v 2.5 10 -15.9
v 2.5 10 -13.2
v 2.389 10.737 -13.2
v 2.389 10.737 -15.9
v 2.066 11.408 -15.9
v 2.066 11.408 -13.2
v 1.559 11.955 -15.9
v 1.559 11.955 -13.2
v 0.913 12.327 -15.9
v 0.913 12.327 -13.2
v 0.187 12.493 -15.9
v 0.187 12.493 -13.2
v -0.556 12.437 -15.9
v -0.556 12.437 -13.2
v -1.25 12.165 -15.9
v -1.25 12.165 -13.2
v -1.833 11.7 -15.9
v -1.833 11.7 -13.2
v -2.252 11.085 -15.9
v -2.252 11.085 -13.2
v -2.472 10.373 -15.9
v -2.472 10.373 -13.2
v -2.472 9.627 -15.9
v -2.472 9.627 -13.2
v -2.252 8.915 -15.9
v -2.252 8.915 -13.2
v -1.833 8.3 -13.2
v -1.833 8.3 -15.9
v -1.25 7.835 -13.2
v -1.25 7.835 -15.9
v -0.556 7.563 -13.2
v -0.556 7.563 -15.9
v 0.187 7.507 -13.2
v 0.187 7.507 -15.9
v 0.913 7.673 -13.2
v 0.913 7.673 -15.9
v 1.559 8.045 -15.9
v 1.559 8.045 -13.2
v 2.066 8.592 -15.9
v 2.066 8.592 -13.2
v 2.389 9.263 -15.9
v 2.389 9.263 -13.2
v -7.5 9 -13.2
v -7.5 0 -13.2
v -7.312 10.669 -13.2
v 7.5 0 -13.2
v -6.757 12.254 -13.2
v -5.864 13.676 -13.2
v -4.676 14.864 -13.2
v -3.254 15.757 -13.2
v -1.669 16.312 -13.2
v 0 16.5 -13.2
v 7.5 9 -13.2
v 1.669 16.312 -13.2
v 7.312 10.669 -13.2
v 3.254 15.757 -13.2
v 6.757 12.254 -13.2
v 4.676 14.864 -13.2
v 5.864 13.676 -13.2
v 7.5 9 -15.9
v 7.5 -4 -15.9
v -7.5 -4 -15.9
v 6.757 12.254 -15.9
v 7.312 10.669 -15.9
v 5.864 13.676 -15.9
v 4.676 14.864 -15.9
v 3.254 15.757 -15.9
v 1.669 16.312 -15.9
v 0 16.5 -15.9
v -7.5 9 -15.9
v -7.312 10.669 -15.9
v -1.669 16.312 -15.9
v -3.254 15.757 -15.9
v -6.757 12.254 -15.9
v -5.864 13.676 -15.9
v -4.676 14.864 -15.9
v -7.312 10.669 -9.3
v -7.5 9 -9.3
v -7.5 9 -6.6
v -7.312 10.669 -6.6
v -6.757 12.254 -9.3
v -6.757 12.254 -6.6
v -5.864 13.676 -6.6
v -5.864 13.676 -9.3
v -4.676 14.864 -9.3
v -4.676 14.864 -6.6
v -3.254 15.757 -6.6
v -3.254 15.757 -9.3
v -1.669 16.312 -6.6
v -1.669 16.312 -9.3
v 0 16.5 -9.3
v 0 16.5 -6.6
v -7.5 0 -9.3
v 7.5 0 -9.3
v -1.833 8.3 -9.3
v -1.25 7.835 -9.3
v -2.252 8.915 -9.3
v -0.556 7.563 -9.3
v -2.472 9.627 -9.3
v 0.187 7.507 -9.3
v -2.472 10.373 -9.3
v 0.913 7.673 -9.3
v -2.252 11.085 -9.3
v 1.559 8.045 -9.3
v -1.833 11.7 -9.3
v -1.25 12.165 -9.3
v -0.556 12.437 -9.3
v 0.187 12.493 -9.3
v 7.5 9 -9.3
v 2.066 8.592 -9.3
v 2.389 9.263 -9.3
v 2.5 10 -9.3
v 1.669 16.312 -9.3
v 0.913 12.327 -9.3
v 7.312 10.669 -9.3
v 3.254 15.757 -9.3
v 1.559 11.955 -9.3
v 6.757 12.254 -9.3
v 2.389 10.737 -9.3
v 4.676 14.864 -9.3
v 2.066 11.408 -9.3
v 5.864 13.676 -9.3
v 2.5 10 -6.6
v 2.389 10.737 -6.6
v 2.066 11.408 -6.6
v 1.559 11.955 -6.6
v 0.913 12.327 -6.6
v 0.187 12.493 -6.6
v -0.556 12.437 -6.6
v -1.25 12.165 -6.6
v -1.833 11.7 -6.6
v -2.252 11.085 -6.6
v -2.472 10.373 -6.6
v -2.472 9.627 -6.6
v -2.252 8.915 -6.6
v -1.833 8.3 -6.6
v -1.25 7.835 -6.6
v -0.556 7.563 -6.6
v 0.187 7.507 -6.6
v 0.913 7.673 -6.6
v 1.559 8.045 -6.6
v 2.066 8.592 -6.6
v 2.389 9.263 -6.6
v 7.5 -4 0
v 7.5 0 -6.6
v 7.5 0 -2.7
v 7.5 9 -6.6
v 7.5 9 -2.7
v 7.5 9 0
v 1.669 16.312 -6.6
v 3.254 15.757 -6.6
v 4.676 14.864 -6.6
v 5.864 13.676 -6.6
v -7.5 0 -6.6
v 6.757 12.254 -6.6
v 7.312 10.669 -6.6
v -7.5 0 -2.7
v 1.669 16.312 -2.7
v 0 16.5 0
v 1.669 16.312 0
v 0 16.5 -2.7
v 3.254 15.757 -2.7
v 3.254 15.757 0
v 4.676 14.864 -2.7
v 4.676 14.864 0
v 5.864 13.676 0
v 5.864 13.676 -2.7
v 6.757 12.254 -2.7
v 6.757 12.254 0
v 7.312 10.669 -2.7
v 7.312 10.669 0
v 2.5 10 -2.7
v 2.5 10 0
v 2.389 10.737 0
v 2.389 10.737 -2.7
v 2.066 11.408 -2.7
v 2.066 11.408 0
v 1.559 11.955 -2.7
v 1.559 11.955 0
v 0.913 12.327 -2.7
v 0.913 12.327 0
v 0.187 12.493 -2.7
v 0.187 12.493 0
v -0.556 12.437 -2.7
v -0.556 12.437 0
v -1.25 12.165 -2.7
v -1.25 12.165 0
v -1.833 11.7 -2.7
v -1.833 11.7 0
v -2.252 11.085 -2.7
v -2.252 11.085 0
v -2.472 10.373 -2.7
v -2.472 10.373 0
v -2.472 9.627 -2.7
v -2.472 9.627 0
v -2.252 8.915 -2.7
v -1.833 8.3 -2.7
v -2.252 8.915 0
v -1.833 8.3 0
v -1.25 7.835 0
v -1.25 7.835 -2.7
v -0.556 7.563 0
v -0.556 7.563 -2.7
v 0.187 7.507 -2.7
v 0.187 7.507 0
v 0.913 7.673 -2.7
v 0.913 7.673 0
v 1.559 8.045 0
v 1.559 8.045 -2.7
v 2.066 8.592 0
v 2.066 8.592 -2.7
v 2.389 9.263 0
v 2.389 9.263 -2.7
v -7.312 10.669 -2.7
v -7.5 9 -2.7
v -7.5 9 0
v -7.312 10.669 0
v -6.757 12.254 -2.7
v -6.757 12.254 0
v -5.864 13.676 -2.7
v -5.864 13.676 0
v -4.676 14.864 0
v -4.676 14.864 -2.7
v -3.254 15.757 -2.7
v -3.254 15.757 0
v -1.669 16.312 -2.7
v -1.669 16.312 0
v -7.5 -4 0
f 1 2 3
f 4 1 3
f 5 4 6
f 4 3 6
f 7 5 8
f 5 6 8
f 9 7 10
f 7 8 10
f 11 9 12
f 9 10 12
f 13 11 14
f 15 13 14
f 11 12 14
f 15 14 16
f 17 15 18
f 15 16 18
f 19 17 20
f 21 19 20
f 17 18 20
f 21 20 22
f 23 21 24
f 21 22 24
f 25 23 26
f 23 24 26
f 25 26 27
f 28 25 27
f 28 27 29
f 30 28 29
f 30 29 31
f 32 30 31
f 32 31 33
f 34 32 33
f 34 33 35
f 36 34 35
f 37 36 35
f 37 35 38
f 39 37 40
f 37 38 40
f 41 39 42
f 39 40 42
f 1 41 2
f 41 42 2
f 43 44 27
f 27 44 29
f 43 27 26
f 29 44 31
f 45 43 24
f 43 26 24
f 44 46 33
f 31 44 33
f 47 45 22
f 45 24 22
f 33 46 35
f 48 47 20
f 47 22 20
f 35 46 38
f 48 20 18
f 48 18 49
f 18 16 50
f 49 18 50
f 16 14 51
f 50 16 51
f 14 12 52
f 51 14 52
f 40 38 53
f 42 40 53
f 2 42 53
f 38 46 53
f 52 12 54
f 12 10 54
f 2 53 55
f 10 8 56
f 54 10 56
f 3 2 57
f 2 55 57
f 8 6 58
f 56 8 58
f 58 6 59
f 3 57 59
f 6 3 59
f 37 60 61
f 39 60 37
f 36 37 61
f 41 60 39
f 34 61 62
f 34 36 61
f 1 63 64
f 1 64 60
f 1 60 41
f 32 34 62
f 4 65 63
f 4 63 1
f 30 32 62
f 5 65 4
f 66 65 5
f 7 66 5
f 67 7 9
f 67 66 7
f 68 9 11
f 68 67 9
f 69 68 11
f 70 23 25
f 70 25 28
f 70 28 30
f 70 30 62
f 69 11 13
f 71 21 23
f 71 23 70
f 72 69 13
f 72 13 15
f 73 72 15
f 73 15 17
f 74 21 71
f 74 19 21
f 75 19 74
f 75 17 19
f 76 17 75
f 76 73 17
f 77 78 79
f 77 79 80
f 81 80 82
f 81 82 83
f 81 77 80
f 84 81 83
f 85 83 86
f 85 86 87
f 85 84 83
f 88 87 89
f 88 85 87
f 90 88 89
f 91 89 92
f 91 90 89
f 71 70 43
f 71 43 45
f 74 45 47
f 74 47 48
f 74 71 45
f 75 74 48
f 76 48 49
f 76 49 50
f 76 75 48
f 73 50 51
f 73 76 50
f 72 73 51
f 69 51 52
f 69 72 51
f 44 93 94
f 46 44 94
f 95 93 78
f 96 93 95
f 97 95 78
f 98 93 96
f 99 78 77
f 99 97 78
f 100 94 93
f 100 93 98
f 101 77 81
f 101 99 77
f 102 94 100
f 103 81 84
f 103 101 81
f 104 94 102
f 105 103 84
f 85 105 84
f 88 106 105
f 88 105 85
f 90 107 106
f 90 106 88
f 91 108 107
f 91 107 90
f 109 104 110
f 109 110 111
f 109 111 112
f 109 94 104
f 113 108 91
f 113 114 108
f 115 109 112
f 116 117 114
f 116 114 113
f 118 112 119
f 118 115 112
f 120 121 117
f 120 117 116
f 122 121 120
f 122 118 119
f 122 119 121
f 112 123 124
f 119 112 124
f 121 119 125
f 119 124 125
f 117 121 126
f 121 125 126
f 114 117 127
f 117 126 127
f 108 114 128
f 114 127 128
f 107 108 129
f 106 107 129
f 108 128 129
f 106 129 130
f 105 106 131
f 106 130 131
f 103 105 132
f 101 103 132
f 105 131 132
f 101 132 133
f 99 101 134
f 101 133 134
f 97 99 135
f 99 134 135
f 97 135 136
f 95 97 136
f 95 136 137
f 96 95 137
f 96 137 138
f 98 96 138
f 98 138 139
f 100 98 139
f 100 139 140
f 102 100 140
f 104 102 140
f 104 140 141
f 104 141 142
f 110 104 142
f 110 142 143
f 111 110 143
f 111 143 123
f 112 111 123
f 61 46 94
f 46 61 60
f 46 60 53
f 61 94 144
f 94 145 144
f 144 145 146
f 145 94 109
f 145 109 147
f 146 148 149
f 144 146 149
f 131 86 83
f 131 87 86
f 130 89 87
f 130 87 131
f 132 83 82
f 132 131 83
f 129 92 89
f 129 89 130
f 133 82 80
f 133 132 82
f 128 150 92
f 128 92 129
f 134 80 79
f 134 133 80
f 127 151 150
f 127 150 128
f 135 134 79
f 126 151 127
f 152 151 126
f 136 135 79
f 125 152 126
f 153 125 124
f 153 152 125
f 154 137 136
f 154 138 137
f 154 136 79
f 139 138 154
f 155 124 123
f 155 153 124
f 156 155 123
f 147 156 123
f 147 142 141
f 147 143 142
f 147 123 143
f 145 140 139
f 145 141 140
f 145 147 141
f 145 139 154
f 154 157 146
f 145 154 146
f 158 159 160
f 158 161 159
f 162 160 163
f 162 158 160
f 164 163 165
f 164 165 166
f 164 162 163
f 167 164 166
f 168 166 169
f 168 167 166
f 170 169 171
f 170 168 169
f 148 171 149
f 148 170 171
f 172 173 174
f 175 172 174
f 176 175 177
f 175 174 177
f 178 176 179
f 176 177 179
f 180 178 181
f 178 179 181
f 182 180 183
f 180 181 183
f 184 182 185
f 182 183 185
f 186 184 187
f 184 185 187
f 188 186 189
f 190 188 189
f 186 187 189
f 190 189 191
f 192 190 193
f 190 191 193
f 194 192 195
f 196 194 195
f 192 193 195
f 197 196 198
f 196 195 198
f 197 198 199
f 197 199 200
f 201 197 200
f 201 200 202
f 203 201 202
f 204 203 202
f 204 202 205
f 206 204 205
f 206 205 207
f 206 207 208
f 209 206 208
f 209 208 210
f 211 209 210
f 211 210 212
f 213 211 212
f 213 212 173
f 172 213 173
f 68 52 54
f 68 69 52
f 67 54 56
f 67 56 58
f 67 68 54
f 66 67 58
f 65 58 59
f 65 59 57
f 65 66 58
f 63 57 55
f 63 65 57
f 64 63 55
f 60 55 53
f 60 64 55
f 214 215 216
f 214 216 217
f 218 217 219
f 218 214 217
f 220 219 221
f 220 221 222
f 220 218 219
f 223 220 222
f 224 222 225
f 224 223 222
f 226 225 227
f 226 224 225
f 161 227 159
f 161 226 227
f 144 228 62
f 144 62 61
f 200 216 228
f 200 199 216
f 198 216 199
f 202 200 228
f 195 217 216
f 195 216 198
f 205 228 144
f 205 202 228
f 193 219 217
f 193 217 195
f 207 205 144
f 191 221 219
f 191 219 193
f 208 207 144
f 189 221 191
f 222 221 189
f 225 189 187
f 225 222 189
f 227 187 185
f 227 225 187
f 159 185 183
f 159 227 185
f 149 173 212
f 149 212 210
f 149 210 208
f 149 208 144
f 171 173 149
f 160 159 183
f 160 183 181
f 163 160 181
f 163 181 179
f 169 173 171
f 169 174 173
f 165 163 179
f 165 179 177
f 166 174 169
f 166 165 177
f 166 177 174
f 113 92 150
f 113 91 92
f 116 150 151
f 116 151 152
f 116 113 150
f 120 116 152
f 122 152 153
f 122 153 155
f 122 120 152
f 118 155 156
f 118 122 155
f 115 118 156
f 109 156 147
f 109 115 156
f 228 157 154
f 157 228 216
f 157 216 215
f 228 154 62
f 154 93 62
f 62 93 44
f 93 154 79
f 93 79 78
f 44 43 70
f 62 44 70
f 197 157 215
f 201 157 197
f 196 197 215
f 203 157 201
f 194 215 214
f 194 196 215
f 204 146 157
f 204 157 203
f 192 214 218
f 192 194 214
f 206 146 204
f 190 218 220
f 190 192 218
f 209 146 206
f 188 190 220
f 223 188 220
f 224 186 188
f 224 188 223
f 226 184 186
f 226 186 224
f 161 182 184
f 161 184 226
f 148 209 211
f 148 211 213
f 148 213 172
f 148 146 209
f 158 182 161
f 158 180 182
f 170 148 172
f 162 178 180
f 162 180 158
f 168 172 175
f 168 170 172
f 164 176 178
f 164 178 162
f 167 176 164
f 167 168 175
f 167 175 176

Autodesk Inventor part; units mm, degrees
ref_plane "YZ Plane" through (0, 0, 0) normal (1, 0, 0) x (0, 1, 0)
ref_plane "XZ Plane" through (0, 0, 0) normal (0, 1, 0) x (-1, 0, 0)
ref_plane "XY Plane" through (0, 0, 0) normal (0, 0, 1) x (1, 0, 0)
sketch "Sketch4" plane through (0, 0, 0) normal (0, 0, 1) x (1, 0, 0)
  line L0 (-10.5, 0) -> (10.5, 0) projected
  line L1 (0, -3.3) -> (0, 19.8) projected
  line L2 (-7.5, 0) -> (7.5, 0)
  line L3 (7.5, 0) -> (7.5, 16.5)
  line L4 (7.5, 16.5) -> (-7.5, 16.5)
  line L5 (-7.5, 16.5) -> (-7.5, 0)
  circle A0 centre (0, 10) radius 2.5
  point P0 (0, 0)
  dimension "d0" = 7.5
  dimension "d1" = 7.5
  dimension "d2" = 16.5
  dimension "d3" = 5
  dimension "d4" = 6.5
extrude "Extrusion1" add sketch "Sketch4" against normal blind 15.9 contours L5 L4 L1 A0 L0 | L1 A0 L4 L3 L0
fillet "Fillet1" radius 7.5 2 edges at (7.5, 16.5, -7.95) (-7.5, 16.5, -7.95)
sketch "Sketch13" plane through (7.5, 9, 0) normal (1, 0, 0) x (0, 0, -1)
  line L0 (0, -12.3) -> (0, 10.8) projected
  line L1 (19.08, -9) -> (-3.18, -9) projected
  line L2 (0, -9) -> (0, 0) projected
  line L3 (0, 7.5) -> (15.9, 7.5) projected
  line L4 (0, -9) -> (2.7, -9)
  line L5 (2.7, -9) -> (2.7, 7.5)
  line L6 (2.7, 7.5) -> (0, 7.5)
  line L7 (0, 7.5) -> (0, -9)
  line L8 (15.9, -9) -> (15.9, 0) projected
  line L9 (15.9, -9) -> (13.2, -9)
  line L10 (13.2, -9) -> (13.2, 7.5)
  line L11 (13.2, 7.5) -> (15.9, 7.5)
  line L12 (15.9, 7.5) -> (15.9, -9)
  line L13 (6.6, -9) -> (9.3, -9)
  line L14 (9.3, -9) -> (9.3, 7.5)
  line L15 (9.3, 7.5) -> (6.6, 7.5)
  line L16 (6.6, 7.5) -> (6.6, -9)
  dimension "d47" = 2.7
  dimension "d48" = 2.7
  dimension "d49" = 2.7
  dimension "d50" = 15.9
  dimension "d51" = 3.9
  dimension "d52" = 3.9
extrude "Extrusion8" cut sketch "Sketch13" against normal through all contours L5 L3 L16 L1 | L14 L3 L10 L1
sketch "Sketch14" plane through (-7.5, 0, -6.6) normal (0, -1, 0) x (1, 0, 0)
  line L0 (0, 6.6) -> (15, 6.6) projected
  line L1 (15, -9.3) -> (0, -9.3) projected
  line L2 (15, 6.6) -> (0, 6.6)
  line L3 (0, 6.6) -> (0, -9.3)
  line L4 (0, -9.3) -> (15, -9.3)
  line L5 (15, -9.3) -> (15, 6.6)
  point P0 (7.5, 6.6)
extrude "Extrusion9" add sketch "Sketch14" along normal blind 4
properties part number "mountGeneric"
